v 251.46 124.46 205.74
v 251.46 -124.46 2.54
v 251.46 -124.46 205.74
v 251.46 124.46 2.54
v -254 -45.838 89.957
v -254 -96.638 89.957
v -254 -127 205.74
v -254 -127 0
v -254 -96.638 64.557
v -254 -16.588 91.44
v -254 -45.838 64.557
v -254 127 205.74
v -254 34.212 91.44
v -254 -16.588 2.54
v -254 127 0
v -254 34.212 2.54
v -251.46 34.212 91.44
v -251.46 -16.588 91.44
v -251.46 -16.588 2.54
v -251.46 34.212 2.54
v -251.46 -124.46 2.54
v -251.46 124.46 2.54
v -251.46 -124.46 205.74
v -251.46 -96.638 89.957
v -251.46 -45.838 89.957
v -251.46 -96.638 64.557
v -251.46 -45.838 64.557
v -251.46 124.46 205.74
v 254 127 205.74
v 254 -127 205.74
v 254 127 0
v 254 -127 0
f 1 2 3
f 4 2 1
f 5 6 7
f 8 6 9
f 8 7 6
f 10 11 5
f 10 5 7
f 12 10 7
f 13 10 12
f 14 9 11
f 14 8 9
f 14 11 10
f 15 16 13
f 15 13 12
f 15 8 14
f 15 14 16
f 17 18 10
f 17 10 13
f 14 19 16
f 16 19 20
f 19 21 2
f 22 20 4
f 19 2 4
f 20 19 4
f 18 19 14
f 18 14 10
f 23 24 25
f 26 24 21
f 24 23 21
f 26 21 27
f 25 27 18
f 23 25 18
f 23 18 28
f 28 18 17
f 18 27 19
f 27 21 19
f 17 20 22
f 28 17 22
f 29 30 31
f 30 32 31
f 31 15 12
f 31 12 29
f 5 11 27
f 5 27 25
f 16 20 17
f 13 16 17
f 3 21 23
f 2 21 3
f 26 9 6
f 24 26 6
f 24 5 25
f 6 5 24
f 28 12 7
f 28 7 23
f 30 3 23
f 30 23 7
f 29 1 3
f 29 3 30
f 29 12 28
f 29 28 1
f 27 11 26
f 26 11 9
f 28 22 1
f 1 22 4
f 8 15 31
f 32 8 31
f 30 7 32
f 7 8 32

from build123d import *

# Parameters (mm, degrees)
F0_W      = 508
F0_H      = 254
F1_DEPTH  = 2.54
F2_W      = 2.54
F2_H      = 254
F3_DEPTH  = 203.2
F4_W      = 505.46
F4_H      = 2.54
F5_DEPTH  = 203.2
F6_W      = 2.54
F6_H      = 251.46
F7_DEPTH  = 203.2
F8_W      = 502.92
F8_H      = 2.54
F9_DEPTH  = 203.2
F10_W     = 50.8
F10_H     = 88.9
F11_DEPTH = 25.4
F12_W     = 50.8
F12_H     = 25.4
F13_DEPTH = 25.4


with BuildPart() as f1:
    # F0 (on Top) → F1 (new body)
    with BuildSketch(Plane.XY):
        Rectangle(F0_W, F0_H)
    extrude(amount=F1_DEPTH)

    # F2 (on face) → F3 (join)
    with BuildSketch(Plane.XY.offset(2.54)):
        with Locations((-252.73, 0)):
            Rectangle(F2_W, F2_H)
    extrude(amount=F3_DEPTH)

    # F4 (on face) → F5 (join)
    with BuildSketch(Plane.XY.offset(2.54)):
        with Locations((1.27, 125.73)):
            Rectangle(F4_W, F4_H)
    extrude(amount=F5_DEPTH)

    # F6 (on face) → F7 (join)
    with BuildSketch(Plane.XY.offset(2.54)):
        with Locations((252.73, -1.27)):
            Rectangle(F6_W, F6_H)
    extrude(amount=F7_DEPTH)

    # F8 (on face) → F9 (join)
    with BuildSketch(Plane.XY.offset(2.54)):
        with Locations((0, -125.73)):
            Rectangle(F8_W, F8_H)
    extrude(amount=F9_DEPTH)

    # F10 (on face) → F11 (cut)
    with BuildSketch(Plane.YZ.offset(-251.46)):
        with Locations((8.812193, 46.99)):
            Rectangle(F10_W, F10_H)
    extrude(amount=-F11_DEPTH, mode=Mode.SUBTRACT)

    # F12 (on face) → F13 (cut)
    with BuildSketch(Plane(origin=(-254, 0, 0), x_dir=(0, -1, 0), z_dir=(-1, 0, 0))):
        with Locations((71.237722, 77.256631)):
            Rectangle(F12_W, F12_H)
    extrude(amount=-F13_DEPTH, mode=Mode.SUBTRACT)


solid = f1.part
